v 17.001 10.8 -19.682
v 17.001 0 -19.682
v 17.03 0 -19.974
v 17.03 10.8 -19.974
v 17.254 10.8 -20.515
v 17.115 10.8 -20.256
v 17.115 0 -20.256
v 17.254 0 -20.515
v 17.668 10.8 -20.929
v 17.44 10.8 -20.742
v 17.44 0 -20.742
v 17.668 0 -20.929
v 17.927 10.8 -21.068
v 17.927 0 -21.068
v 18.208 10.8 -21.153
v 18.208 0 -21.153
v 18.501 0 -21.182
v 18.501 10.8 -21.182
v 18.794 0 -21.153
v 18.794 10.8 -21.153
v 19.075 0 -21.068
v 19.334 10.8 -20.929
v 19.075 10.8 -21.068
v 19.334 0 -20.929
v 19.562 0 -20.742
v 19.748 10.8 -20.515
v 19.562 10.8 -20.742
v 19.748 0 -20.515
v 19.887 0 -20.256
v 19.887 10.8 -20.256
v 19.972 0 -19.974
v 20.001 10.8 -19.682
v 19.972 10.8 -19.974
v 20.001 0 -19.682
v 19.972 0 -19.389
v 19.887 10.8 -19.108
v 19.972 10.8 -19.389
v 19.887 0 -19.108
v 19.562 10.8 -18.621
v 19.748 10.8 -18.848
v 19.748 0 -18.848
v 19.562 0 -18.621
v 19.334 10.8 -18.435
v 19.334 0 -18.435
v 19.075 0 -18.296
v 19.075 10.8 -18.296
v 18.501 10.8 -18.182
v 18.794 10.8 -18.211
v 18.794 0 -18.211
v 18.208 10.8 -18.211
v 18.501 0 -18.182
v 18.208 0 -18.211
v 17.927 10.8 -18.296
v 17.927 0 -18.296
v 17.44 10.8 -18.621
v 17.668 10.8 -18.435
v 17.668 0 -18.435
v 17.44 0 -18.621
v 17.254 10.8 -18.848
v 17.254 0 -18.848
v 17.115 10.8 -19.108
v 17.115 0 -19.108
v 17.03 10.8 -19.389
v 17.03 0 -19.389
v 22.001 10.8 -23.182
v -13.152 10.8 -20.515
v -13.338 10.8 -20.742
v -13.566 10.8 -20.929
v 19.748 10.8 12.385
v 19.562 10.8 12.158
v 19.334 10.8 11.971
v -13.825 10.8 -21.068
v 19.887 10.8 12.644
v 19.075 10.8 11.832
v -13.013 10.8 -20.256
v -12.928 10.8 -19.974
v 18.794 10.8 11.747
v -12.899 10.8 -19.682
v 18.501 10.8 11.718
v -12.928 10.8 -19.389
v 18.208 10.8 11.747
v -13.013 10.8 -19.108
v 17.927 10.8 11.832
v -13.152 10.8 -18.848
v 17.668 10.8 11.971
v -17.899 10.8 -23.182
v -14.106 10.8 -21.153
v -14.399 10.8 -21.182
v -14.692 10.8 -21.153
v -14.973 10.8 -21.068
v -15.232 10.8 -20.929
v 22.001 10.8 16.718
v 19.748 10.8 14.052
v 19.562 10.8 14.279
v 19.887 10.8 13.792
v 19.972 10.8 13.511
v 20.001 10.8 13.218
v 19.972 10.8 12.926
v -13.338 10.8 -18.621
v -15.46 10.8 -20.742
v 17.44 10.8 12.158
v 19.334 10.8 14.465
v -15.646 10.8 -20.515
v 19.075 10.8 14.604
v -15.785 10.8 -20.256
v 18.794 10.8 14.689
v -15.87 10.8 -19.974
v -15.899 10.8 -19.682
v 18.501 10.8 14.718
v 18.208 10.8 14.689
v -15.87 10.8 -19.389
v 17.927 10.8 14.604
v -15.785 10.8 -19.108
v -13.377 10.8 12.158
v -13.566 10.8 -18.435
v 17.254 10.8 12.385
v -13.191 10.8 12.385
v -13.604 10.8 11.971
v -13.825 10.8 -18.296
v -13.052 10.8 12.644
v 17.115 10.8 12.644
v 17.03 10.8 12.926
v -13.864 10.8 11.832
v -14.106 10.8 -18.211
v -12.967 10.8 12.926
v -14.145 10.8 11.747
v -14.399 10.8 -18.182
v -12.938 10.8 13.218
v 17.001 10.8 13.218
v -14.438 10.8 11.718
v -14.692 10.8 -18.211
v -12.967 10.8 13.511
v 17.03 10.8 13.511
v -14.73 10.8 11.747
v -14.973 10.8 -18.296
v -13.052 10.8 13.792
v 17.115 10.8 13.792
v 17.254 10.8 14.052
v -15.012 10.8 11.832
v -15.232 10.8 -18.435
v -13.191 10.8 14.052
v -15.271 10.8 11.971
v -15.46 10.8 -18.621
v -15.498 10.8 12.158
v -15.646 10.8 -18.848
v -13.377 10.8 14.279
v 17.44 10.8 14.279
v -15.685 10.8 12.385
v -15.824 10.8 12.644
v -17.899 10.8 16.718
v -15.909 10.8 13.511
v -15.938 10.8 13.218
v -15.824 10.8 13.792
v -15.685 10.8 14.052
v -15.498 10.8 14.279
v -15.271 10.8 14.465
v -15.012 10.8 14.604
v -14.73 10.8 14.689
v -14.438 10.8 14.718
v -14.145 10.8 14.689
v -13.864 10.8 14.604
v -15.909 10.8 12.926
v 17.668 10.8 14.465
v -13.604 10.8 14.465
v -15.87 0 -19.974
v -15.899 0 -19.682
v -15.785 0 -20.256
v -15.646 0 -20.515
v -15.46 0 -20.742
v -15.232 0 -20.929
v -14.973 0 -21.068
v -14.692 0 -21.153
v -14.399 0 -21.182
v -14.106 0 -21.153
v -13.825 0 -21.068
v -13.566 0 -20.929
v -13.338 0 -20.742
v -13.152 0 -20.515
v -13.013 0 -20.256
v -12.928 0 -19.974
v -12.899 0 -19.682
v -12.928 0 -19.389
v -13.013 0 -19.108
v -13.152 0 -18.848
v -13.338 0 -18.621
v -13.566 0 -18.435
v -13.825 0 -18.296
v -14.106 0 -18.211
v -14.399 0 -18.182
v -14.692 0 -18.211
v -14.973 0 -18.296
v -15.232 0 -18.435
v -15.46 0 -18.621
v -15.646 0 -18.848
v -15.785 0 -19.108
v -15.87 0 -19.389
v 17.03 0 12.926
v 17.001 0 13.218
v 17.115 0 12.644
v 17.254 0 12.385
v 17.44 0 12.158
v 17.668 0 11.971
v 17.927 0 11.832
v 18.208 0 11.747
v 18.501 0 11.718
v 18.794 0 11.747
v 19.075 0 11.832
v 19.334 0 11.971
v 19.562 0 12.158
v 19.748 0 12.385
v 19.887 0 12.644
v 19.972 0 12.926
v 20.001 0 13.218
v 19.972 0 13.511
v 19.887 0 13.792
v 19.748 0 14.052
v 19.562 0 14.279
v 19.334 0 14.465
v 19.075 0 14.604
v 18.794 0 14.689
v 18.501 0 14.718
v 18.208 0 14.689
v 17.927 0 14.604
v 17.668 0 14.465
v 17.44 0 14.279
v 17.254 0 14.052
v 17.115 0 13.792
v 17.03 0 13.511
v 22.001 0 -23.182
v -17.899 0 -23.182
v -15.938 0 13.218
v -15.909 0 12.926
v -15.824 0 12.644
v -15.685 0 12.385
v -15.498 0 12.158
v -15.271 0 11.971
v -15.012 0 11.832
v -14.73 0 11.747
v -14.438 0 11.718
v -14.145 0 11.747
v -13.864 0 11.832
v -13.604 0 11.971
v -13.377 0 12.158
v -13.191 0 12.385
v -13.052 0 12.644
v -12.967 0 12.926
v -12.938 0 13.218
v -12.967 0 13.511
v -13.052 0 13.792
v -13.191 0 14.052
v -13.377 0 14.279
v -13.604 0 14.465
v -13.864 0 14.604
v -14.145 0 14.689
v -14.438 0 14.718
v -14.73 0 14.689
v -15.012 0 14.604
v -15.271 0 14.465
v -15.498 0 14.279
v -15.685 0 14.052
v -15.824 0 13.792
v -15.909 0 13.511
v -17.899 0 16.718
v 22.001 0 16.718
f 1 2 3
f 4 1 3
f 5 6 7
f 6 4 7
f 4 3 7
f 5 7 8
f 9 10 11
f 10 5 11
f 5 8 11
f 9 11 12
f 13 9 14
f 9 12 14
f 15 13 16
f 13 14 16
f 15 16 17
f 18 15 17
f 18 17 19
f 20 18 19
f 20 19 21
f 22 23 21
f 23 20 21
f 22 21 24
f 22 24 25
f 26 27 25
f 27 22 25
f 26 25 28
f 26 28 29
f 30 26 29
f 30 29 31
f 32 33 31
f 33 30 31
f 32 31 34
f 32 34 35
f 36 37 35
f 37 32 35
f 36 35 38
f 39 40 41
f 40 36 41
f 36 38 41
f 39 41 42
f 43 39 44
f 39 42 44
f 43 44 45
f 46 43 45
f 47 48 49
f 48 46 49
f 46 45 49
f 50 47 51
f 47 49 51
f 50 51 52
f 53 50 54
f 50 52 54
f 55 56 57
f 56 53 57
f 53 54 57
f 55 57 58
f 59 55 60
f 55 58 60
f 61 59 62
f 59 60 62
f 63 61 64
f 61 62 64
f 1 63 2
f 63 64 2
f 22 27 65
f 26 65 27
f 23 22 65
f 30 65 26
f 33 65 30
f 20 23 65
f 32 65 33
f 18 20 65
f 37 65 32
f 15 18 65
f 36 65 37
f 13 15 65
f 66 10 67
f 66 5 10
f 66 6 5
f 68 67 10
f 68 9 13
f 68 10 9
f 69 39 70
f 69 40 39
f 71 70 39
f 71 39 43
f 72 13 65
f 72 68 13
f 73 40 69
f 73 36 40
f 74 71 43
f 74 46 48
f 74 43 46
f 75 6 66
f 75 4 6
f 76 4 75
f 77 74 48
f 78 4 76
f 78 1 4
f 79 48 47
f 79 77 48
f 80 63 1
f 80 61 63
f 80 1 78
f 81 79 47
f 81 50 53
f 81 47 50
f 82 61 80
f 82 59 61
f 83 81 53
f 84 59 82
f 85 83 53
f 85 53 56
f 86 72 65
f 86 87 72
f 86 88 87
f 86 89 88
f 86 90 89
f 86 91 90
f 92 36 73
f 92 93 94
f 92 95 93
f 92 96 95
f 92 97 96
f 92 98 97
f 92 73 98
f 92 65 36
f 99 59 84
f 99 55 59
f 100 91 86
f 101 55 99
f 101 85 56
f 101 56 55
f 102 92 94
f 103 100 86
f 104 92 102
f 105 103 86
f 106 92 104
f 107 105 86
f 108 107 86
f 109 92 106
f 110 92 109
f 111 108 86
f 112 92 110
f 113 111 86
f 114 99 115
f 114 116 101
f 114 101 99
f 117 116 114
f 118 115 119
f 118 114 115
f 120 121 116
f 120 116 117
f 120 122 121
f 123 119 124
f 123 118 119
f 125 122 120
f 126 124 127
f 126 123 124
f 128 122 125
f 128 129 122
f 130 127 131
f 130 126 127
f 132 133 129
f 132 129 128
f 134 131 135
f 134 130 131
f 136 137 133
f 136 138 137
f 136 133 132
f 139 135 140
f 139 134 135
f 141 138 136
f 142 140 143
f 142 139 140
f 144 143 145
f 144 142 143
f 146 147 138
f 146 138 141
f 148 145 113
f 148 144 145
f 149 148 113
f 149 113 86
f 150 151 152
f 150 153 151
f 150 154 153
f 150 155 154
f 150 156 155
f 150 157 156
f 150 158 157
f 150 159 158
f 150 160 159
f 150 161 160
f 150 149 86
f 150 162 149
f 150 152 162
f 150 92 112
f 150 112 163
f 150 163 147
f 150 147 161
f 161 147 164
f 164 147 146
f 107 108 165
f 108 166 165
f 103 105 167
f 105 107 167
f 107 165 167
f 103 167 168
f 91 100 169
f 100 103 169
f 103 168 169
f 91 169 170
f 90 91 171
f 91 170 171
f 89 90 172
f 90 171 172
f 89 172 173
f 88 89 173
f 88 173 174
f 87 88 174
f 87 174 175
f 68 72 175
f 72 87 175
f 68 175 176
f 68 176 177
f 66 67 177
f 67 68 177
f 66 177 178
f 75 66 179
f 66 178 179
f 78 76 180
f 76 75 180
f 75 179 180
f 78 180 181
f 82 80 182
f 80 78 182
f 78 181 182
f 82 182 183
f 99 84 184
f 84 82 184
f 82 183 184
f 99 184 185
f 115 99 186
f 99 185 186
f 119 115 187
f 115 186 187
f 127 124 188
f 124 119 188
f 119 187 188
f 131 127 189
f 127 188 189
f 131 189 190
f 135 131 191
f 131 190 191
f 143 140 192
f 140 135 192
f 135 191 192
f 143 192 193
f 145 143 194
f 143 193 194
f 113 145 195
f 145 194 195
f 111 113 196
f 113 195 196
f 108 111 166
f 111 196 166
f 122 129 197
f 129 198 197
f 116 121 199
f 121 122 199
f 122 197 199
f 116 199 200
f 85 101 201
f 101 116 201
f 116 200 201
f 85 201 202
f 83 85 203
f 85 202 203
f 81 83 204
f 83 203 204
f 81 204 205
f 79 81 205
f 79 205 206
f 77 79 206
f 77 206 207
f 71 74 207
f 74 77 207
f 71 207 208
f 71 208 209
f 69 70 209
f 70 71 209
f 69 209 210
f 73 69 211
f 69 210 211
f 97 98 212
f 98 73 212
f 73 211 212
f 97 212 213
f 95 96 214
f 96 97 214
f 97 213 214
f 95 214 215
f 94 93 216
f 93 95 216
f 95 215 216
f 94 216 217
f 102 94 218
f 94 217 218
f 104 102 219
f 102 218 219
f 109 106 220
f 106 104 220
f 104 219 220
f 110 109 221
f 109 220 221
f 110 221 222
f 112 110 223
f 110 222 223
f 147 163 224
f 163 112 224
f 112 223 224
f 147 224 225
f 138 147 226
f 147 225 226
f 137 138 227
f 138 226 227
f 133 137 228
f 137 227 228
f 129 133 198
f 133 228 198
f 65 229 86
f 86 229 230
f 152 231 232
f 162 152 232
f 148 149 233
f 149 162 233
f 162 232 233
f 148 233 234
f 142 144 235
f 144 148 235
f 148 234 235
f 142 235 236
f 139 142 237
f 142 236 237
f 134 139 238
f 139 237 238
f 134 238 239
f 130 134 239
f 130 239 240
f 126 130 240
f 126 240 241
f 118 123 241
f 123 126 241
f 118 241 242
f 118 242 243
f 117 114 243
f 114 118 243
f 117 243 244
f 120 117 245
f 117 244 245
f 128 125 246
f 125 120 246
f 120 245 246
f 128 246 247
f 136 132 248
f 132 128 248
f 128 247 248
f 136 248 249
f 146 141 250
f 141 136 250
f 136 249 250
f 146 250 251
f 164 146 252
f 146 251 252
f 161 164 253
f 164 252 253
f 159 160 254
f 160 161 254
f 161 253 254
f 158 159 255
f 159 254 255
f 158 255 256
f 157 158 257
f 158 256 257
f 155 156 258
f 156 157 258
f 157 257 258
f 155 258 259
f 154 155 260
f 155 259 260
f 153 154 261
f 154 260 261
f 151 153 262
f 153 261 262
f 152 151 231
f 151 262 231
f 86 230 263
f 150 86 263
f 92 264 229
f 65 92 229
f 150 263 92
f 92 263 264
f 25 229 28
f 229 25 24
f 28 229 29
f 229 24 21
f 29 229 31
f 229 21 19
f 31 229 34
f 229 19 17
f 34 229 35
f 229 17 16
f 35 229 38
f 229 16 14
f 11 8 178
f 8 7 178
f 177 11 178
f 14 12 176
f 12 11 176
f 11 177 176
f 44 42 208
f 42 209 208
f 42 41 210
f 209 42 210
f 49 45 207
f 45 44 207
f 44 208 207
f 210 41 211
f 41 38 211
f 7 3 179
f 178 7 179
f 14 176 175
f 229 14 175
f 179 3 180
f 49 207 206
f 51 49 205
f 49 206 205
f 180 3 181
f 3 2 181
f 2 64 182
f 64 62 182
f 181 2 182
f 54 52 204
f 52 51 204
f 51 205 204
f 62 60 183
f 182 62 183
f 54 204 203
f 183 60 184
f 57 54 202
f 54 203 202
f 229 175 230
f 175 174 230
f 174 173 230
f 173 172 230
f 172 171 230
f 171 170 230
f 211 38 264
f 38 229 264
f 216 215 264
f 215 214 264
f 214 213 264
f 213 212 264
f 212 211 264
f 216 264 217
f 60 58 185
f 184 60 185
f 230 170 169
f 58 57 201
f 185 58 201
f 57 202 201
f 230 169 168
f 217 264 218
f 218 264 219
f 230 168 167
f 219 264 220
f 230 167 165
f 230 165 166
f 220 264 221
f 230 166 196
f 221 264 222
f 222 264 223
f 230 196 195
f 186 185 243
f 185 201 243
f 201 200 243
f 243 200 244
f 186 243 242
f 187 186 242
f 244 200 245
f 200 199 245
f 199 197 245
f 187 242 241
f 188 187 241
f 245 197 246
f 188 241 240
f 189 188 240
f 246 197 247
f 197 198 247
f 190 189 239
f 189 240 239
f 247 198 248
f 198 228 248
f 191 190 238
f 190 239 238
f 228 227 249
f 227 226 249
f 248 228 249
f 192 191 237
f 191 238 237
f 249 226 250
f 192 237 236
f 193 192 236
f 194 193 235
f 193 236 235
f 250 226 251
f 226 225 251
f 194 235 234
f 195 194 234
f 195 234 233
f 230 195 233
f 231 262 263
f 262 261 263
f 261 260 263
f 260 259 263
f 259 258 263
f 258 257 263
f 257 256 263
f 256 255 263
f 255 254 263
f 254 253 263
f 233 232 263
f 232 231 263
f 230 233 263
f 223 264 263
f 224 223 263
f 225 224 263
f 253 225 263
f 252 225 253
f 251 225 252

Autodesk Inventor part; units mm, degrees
ref_plane "YZ Plane" through (0, 0, 0) normal (1, 0, 0) x (0, 1, 0)
ref_plane "XZ Plane" through (0, 0, 0) normal (0, 1, 0) x (-1, 0, 0)
ref_plane "XY Plane" through (0, 0, 0) normal (0, 0, 1) x (1, 0, 0)
sketch "Sketch1" plane through (0, 0, 0) normal (0, 1, 0) x (-1, 0, 0)
  line L0 (-22.0009, 16.7182) -> (-22.0009, -23.1818)
  line L1 (-22.0009, -23.1818) -> (17.8991, -23.1818)
  line L2 (17.8991, -23.1818) -> (17.8991, 16.7182)
  line L3 (17.8991, 16.7182) -> (-22.0009, 16.7182)
  circle A0 centre (14.3991, -19.6818) radius 1.5
  circle A1 centre (14.4378, 13.2182) radius 1.5
  circle A2 centre (-18.5009, 13.2182) radius 1.5
  circle A3 centre (-18.5009, -19.6818) radius 1.5
  point P0 (0, 0)
  dimension "d0" = 39.9
  dimension "d2" = 39.9
  dimension "d3" = 3
  dimension "d4" = 3
  dimension "d5" = 3
  dimension "d6" = 3
  dimension "d7" = 3.5
  dimension "d8" = 3.5
  dimension "d9" = 3.5
  dimension "d10" = 3.5
  dimension "d11" = 3.5
  dimension "d12" = 3.5
  dimension "d13" = 3.5
extrude "Extrusion1" add sketch "Sketch1" along normal blind 10.8
properties part number "ventilator"
